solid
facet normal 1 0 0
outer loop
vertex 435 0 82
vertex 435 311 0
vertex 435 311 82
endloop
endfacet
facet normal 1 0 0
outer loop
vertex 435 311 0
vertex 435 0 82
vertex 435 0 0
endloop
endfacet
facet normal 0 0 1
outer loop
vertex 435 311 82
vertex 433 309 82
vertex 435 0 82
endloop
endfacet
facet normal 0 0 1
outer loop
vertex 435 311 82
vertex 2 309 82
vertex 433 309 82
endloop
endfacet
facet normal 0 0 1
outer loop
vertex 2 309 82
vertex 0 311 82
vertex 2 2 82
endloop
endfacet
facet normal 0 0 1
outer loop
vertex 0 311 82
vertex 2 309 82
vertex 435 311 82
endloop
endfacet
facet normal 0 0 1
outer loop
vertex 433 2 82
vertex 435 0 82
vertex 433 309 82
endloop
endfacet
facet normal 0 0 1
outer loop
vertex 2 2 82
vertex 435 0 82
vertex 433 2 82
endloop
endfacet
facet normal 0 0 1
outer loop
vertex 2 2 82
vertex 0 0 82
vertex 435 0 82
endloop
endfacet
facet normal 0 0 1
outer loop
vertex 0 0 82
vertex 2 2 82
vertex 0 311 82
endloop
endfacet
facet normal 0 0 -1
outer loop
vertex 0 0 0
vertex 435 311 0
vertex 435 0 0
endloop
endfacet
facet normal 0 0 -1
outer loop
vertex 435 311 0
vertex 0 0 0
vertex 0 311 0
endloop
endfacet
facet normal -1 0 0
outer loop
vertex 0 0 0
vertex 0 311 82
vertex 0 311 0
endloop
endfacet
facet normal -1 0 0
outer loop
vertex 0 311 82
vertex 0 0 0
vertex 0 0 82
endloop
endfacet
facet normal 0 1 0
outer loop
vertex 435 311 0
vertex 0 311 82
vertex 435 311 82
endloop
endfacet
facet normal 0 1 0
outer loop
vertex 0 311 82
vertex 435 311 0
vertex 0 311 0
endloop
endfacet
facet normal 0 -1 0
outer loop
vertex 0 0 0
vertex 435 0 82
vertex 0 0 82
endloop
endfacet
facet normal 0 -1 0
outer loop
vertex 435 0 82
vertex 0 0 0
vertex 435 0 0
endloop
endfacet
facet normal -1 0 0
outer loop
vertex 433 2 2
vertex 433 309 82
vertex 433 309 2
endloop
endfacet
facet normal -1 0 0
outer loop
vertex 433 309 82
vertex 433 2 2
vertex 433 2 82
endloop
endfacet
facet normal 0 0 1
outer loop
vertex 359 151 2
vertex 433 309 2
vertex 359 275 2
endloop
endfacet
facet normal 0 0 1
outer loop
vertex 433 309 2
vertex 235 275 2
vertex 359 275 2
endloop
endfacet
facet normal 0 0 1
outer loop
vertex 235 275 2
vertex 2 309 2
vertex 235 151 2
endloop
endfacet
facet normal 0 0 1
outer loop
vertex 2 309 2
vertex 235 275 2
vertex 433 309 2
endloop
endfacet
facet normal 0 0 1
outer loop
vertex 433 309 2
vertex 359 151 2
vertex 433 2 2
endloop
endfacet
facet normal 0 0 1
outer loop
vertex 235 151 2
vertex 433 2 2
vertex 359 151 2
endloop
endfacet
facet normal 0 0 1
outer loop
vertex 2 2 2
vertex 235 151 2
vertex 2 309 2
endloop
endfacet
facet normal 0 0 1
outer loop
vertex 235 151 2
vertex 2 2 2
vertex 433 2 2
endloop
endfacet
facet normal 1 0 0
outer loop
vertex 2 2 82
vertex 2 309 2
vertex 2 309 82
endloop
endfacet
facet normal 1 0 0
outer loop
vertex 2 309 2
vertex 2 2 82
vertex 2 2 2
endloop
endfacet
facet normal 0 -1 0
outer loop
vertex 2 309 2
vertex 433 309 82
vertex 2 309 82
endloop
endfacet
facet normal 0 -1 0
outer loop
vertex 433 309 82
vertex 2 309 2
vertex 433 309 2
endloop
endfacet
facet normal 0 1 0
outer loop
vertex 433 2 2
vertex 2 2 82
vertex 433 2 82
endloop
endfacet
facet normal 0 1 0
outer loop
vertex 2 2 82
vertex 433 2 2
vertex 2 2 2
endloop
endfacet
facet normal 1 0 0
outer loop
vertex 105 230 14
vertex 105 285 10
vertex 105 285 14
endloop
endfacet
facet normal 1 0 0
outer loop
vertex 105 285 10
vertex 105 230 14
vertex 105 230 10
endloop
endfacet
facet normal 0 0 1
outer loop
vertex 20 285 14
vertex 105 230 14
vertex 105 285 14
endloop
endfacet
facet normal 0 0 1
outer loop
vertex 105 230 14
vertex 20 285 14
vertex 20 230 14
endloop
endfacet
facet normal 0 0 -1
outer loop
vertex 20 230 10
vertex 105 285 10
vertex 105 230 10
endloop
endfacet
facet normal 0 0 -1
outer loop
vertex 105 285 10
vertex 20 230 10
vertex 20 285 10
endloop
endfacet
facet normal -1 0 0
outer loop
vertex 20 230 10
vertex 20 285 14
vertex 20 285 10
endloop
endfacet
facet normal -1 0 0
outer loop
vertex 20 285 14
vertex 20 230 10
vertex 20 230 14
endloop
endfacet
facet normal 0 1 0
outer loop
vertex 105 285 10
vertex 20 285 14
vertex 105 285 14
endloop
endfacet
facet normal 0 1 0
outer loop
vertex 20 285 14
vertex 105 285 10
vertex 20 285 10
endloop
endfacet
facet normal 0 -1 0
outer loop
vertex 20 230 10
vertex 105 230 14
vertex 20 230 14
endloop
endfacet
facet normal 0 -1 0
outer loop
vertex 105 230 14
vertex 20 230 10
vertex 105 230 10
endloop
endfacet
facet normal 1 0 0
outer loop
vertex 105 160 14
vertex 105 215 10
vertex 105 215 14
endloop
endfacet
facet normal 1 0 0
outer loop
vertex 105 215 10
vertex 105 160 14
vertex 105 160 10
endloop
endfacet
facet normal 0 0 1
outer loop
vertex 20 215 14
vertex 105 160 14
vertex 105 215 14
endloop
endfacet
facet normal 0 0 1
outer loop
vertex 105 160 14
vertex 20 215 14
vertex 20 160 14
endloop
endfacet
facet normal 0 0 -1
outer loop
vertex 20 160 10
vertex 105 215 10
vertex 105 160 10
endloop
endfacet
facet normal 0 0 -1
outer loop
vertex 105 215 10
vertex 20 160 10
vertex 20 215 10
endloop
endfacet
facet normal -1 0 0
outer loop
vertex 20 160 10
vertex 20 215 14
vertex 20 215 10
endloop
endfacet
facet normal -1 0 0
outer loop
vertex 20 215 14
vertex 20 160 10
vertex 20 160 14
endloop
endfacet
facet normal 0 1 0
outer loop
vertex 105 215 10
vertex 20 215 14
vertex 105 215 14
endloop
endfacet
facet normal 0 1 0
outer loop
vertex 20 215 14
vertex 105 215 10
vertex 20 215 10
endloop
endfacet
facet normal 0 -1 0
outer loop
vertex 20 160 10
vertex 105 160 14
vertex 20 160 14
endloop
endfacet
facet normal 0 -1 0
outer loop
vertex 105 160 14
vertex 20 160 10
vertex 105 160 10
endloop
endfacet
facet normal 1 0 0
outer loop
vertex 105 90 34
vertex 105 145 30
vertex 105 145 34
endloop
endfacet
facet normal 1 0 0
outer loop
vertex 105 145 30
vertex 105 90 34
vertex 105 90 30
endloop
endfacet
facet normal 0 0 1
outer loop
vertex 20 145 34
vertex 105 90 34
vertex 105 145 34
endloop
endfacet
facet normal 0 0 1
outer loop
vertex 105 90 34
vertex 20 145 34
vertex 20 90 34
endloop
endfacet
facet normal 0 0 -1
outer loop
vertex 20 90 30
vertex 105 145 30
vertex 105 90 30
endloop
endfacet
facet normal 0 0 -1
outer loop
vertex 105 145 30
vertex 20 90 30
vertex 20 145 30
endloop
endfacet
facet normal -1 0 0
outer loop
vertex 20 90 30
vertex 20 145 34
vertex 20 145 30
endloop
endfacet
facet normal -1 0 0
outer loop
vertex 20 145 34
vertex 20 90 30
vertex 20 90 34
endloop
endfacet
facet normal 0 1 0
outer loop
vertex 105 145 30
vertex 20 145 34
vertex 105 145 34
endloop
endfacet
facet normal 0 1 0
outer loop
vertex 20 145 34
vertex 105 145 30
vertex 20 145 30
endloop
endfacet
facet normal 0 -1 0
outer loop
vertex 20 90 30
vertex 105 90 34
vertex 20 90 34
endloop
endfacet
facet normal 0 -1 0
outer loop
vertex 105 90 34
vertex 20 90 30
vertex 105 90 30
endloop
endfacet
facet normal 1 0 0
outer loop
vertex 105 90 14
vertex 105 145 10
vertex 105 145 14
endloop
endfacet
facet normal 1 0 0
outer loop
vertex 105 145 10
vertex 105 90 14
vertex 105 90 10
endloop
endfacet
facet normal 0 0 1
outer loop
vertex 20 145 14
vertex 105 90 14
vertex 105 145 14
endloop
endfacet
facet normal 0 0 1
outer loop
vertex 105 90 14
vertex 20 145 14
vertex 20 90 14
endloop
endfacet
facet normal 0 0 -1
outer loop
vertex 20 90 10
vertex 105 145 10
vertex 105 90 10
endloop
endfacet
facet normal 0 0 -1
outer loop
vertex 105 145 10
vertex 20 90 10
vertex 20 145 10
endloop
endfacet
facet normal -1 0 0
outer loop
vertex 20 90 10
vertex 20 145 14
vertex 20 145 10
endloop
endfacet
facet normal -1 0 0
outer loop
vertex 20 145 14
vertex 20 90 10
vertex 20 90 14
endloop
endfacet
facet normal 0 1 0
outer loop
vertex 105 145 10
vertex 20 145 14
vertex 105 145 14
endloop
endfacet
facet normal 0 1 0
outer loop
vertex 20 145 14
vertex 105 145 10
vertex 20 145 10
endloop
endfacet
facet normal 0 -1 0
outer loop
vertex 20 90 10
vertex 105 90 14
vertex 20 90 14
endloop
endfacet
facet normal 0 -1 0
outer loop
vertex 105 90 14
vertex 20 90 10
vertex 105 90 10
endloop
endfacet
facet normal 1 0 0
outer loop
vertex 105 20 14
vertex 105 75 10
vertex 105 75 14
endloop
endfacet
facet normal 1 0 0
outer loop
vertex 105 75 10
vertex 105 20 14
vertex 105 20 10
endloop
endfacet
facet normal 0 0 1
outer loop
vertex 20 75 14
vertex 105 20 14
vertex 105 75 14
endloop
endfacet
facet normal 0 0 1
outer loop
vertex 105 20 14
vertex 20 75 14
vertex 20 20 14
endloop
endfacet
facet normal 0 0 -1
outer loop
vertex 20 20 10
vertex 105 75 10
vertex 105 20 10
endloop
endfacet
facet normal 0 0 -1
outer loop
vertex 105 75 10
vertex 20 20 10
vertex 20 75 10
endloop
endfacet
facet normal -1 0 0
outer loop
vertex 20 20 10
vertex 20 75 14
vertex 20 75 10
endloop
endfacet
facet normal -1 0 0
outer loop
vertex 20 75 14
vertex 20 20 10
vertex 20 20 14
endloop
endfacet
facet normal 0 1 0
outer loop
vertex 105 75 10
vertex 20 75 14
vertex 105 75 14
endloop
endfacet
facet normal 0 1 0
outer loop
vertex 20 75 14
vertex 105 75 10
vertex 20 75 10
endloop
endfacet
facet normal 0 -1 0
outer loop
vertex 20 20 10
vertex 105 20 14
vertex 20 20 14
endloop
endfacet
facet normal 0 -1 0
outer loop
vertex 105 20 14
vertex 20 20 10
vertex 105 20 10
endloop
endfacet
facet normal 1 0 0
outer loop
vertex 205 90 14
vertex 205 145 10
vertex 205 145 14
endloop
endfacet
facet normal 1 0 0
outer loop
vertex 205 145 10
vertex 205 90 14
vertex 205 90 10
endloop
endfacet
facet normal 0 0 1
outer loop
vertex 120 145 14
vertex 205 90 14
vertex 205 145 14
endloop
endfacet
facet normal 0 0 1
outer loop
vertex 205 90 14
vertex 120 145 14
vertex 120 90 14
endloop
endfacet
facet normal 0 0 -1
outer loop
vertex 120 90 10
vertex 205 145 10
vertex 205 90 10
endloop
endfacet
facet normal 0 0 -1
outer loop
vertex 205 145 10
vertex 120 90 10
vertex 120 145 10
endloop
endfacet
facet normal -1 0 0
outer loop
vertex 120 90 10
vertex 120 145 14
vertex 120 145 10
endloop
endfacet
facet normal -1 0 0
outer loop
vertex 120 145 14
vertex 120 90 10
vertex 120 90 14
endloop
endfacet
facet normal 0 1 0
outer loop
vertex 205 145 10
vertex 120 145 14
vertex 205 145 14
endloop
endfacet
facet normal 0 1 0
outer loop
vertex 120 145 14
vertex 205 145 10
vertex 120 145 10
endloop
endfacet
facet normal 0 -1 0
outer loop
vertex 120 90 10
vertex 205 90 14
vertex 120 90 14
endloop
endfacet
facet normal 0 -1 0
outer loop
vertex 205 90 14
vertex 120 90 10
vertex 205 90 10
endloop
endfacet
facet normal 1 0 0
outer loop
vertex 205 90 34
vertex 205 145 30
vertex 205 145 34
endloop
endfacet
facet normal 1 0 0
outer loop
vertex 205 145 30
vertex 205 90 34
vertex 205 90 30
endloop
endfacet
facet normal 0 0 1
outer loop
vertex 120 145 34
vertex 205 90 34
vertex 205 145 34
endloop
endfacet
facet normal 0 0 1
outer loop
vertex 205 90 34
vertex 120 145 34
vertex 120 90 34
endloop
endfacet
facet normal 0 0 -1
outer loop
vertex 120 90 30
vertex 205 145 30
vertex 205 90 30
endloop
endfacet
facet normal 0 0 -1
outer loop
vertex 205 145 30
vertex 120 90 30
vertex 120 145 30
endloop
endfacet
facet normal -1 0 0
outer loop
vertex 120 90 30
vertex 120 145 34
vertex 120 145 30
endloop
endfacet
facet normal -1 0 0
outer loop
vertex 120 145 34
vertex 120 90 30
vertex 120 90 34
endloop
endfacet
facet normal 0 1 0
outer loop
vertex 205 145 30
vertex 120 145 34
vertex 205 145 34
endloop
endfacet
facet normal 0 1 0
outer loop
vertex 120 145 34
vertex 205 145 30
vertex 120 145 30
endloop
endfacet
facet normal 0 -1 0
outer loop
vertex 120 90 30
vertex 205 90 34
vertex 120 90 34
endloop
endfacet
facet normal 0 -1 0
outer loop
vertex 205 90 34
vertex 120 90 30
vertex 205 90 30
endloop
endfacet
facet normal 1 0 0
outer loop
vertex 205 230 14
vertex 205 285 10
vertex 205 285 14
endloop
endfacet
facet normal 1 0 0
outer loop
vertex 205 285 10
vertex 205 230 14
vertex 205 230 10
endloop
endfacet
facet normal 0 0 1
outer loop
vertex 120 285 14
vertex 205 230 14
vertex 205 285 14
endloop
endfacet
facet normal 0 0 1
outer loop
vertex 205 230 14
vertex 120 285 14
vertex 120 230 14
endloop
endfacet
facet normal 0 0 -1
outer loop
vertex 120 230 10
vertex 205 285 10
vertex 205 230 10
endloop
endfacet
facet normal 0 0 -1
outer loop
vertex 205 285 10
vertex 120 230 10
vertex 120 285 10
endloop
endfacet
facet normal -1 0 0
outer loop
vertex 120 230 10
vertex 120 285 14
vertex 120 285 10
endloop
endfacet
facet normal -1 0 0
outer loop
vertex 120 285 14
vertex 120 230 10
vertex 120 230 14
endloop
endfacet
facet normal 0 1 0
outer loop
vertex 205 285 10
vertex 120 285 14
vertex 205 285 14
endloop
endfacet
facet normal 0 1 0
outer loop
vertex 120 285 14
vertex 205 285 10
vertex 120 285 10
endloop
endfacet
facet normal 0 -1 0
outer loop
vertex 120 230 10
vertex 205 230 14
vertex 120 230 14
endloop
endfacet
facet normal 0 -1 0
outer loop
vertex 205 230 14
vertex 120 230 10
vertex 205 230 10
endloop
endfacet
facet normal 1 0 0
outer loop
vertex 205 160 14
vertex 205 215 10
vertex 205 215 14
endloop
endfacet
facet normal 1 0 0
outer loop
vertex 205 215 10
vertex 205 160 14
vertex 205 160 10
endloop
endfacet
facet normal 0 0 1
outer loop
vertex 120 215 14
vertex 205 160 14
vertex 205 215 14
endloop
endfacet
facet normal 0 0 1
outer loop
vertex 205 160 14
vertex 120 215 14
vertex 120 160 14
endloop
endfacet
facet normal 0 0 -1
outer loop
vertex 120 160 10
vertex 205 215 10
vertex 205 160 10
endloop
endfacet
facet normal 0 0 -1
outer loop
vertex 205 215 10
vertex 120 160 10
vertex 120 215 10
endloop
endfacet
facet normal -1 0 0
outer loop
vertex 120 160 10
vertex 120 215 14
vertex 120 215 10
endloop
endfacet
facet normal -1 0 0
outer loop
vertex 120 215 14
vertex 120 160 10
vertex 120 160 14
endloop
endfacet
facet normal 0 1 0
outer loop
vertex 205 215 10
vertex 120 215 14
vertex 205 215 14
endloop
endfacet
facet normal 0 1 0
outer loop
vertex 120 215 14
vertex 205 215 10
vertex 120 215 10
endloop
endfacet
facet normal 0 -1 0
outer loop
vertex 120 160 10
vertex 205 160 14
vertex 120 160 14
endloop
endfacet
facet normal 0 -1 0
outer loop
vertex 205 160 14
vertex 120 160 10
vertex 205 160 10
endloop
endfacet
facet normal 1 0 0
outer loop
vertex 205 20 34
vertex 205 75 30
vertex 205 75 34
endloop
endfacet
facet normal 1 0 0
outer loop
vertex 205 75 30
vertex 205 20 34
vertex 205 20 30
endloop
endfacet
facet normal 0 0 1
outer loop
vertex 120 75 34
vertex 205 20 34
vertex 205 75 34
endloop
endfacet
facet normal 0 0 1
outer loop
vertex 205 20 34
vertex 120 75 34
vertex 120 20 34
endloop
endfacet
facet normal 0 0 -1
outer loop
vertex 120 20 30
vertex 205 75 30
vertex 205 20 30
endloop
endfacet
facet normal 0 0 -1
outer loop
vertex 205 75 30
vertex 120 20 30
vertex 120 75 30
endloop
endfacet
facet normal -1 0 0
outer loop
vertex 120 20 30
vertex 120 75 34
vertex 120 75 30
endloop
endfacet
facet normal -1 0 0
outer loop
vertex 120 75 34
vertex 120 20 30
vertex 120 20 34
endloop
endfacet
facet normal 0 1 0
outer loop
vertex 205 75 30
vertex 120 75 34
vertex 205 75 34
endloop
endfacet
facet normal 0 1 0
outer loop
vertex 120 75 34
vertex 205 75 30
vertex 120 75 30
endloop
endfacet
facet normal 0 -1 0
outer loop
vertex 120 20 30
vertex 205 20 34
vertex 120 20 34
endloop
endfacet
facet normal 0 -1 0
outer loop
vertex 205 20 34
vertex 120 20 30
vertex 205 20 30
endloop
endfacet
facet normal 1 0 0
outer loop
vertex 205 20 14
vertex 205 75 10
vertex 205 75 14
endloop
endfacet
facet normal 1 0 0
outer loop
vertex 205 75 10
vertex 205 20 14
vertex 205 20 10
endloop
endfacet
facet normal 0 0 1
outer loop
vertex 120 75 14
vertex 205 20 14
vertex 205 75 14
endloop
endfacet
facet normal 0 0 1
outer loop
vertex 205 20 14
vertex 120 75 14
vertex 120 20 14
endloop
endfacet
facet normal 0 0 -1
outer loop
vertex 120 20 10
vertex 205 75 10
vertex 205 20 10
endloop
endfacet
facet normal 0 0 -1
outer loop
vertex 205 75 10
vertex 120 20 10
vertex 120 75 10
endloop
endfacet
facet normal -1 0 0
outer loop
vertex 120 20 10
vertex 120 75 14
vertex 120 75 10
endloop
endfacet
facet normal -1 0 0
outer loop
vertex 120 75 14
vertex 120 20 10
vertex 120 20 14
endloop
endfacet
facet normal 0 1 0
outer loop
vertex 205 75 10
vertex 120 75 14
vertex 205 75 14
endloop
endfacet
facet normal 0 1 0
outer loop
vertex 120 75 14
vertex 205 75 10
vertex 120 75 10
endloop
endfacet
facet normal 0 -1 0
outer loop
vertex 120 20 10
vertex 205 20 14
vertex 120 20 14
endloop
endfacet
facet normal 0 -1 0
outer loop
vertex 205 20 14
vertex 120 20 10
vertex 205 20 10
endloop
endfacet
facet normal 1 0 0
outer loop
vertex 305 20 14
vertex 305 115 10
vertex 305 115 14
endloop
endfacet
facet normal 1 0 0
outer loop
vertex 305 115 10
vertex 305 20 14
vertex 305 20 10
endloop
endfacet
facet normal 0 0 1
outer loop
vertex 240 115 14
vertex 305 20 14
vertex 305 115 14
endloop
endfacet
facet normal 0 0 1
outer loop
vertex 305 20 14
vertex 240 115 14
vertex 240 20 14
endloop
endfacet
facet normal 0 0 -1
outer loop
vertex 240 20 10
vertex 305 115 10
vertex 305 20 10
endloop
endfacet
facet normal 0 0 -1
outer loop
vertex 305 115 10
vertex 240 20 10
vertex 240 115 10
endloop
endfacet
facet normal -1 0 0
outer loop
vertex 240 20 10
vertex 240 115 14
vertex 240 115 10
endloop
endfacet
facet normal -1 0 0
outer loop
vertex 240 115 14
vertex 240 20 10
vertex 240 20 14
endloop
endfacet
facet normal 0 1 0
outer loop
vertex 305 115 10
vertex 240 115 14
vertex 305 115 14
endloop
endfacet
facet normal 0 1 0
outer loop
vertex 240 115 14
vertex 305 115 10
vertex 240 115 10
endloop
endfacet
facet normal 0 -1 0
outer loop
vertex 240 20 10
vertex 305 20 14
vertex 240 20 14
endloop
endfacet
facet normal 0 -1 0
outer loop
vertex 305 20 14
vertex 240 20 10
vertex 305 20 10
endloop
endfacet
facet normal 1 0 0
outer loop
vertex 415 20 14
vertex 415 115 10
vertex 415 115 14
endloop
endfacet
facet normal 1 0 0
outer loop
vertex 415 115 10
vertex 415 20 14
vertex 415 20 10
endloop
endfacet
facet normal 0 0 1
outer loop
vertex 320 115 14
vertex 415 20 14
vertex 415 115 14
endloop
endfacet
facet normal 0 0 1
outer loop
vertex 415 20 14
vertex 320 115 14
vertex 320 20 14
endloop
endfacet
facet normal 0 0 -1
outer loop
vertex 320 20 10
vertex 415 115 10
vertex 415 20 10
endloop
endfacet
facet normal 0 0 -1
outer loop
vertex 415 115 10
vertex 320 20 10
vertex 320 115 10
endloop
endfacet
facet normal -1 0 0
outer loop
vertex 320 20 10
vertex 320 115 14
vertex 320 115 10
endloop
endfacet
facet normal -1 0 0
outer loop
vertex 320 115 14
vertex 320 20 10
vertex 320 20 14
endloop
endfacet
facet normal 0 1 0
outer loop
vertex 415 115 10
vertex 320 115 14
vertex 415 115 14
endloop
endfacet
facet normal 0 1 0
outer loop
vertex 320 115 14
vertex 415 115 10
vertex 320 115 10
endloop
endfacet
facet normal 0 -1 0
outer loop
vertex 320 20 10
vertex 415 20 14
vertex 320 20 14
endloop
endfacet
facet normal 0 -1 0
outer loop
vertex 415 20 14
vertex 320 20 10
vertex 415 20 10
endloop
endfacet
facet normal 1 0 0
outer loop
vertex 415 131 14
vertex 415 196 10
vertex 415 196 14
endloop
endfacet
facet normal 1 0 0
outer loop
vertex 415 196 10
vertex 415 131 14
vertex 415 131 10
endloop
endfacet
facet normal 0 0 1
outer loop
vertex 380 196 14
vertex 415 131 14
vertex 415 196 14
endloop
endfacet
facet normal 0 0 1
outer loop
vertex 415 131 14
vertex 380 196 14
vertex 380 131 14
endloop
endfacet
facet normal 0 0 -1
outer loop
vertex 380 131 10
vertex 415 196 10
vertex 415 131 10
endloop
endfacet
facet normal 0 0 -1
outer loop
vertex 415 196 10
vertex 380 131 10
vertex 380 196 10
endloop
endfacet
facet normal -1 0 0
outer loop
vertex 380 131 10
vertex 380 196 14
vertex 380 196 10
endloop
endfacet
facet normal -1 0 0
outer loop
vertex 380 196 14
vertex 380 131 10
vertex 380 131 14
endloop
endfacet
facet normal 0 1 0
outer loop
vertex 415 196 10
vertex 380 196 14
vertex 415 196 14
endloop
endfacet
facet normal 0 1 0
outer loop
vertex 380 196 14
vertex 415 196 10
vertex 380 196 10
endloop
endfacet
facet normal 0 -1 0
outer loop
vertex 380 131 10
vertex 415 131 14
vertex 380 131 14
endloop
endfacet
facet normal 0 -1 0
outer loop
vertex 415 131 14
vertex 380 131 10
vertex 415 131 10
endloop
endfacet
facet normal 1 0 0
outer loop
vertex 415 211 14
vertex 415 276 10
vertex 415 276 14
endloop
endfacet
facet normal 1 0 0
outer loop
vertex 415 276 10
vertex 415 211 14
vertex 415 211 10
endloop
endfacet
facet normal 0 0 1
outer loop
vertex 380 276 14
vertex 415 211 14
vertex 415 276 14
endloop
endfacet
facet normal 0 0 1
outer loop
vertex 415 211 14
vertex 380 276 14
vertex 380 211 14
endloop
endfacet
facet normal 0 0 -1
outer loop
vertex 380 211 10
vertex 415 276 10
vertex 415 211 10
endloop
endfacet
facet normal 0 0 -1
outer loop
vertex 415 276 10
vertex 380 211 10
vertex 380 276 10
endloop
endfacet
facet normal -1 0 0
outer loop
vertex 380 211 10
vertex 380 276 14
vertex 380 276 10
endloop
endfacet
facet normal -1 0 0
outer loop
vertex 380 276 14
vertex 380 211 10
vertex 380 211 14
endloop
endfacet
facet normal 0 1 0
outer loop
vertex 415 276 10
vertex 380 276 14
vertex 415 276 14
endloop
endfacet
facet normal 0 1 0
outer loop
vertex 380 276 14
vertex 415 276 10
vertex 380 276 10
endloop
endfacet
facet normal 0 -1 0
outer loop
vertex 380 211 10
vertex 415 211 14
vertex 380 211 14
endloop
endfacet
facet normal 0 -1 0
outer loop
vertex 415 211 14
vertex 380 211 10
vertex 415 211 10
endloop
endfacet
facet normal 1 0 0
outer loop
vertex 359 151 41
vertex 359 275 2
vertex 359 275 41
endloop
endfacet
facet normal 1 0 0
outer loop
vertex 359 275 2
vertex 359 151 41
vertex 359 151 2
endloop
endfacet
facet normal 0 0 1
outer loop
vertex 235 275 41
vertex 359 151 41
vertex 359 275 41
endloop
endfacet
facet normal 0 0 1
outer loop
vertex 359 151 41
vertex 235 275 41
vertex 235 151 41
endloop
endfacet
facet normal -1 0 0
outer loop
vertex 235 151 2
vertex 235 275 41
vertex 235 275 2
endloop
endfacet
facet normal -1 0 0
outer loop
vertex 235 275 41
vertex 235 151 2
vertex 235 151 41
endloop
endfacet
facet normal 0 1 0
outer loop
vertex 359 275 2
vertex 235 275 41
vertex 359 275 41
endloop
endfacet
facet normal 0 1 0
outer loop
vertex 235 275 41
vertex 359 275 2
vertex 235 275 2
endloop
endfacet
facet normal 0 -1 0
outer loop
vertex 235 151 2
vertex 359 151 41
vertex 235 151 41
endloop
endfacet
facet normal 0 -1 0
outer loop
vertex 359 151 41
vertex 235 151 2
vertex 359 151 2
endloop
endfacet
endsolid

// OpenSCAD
width = 435;
height = 82;
depth = 311;

margin_lr = 20;

$fn = 64;

difference() {
  cube( [ width, depth, height ] );
            
  translate( [ 2, 2, 2 ] ) {
    cube( [ width - 4, depth - 4, height + 10 ] );
  }
}

// Column One 

// PCM5142/DAC
translate( [ margin_lr, 220 + margin_lr - 10, 10 ] ) {
  color( "black" )
  cube( [ 85, 55, 4 ] );   
}

// DSP
translate( [ margin_lr, 150 + margin_lr - 10, 10 ] ) {
  color( "orange" )
  cube( [ 85, 55, 4 ] );   
}


// I2S board (violet)
translate( [ margin_lr, margin_lr + 70, 30 ] ) {
  color( "violet" )
  cube( [ 85, 55, 4 ] );   
}


/*
// subwoofer
translate( [ margin_lr, margin_lr + 210, 10 ] ) {
    color( "pink" )
  cube( [ 85, 55, 4 ] );   
}
*/

// SPDIF (cyan)
translate( [ margin_lr, margin_lr + 70, 10 ] ) {
    color( "cyan" )
  cube( [ 85, 55, 4 ] );   
}


// microprocessor
translate( [ margin_lr, margin_lr, 10 ] ) {
  color( "brown" )
  cube( [ 85, 55, 4 ] );   
}



// Column Two

// vinyl (RED)
translate( [ 120, margin_lr + 70, 10 ] ) {
  color( "red" )
  cube( [ 85, 55, 4 ] );   
}

// ADC board (indigo)
translate( [ 120, margin_lr + 70, 30 ] ) {
  color( "indigo" )
  cube( [ 85, 55, 4 ] );   
}


// inputs (grey)
translate( [ 120, margin_lr + 210, 10 ] ) {
  color( "grey" )
  cube( [ 85, 55, 4 ] );   
}

// channel sel (Yellow)
translate( [ 120, margin_lr + 140, 10 ] ) {
  color( "yellow" )
  cube( [ 85, 55, 4 ] );   
}

// GPIO extender (blue)
translate( [ margin_lr + 100, margin_lr, 30 ] ) {
  color( "#000080" )
  cube( [ 85, 55, 4 ] );   
}

// FTDI (purple)
translate( [ margin_lr + 100, margin_lr, 10 ] ) {
  color( "purple" )
  cube( [ 85, 55, 4 ] );   
}

// POWER ROW

// digital/ananlog power suppy
translate( [ 240, margin_lr, 10 ] ) {
  color( "Lavender" )
  cube( [ 65, 95, 4 ] );   
}
    
// power suppy
translate( [ width - margin_lr - 95, margin_lr, 10 ] ) {
  cube( [ 95, 95, 4 ] );   
}

// rectifier (pink)
translate( [ width - margin_lr - 35, depth - 160 - margin_lr, 10 ] ) {
  color( "pink" )
  cube( [ 35, 65, 4 ] );   
}

// ground lift (green)
translate( [ width - margin_lr - 35, depth - 80 - margin_lr, 10 ] ) {
  color( "green" )
  cube( [ 35, 65, 4 ] );   
}



// toroid
translate( [ width - margin_lr - 180, depth - margin_lr - 10 -130, 0 ] ) {
  cube( [ 124, 124, 41 ] );   
}
       
